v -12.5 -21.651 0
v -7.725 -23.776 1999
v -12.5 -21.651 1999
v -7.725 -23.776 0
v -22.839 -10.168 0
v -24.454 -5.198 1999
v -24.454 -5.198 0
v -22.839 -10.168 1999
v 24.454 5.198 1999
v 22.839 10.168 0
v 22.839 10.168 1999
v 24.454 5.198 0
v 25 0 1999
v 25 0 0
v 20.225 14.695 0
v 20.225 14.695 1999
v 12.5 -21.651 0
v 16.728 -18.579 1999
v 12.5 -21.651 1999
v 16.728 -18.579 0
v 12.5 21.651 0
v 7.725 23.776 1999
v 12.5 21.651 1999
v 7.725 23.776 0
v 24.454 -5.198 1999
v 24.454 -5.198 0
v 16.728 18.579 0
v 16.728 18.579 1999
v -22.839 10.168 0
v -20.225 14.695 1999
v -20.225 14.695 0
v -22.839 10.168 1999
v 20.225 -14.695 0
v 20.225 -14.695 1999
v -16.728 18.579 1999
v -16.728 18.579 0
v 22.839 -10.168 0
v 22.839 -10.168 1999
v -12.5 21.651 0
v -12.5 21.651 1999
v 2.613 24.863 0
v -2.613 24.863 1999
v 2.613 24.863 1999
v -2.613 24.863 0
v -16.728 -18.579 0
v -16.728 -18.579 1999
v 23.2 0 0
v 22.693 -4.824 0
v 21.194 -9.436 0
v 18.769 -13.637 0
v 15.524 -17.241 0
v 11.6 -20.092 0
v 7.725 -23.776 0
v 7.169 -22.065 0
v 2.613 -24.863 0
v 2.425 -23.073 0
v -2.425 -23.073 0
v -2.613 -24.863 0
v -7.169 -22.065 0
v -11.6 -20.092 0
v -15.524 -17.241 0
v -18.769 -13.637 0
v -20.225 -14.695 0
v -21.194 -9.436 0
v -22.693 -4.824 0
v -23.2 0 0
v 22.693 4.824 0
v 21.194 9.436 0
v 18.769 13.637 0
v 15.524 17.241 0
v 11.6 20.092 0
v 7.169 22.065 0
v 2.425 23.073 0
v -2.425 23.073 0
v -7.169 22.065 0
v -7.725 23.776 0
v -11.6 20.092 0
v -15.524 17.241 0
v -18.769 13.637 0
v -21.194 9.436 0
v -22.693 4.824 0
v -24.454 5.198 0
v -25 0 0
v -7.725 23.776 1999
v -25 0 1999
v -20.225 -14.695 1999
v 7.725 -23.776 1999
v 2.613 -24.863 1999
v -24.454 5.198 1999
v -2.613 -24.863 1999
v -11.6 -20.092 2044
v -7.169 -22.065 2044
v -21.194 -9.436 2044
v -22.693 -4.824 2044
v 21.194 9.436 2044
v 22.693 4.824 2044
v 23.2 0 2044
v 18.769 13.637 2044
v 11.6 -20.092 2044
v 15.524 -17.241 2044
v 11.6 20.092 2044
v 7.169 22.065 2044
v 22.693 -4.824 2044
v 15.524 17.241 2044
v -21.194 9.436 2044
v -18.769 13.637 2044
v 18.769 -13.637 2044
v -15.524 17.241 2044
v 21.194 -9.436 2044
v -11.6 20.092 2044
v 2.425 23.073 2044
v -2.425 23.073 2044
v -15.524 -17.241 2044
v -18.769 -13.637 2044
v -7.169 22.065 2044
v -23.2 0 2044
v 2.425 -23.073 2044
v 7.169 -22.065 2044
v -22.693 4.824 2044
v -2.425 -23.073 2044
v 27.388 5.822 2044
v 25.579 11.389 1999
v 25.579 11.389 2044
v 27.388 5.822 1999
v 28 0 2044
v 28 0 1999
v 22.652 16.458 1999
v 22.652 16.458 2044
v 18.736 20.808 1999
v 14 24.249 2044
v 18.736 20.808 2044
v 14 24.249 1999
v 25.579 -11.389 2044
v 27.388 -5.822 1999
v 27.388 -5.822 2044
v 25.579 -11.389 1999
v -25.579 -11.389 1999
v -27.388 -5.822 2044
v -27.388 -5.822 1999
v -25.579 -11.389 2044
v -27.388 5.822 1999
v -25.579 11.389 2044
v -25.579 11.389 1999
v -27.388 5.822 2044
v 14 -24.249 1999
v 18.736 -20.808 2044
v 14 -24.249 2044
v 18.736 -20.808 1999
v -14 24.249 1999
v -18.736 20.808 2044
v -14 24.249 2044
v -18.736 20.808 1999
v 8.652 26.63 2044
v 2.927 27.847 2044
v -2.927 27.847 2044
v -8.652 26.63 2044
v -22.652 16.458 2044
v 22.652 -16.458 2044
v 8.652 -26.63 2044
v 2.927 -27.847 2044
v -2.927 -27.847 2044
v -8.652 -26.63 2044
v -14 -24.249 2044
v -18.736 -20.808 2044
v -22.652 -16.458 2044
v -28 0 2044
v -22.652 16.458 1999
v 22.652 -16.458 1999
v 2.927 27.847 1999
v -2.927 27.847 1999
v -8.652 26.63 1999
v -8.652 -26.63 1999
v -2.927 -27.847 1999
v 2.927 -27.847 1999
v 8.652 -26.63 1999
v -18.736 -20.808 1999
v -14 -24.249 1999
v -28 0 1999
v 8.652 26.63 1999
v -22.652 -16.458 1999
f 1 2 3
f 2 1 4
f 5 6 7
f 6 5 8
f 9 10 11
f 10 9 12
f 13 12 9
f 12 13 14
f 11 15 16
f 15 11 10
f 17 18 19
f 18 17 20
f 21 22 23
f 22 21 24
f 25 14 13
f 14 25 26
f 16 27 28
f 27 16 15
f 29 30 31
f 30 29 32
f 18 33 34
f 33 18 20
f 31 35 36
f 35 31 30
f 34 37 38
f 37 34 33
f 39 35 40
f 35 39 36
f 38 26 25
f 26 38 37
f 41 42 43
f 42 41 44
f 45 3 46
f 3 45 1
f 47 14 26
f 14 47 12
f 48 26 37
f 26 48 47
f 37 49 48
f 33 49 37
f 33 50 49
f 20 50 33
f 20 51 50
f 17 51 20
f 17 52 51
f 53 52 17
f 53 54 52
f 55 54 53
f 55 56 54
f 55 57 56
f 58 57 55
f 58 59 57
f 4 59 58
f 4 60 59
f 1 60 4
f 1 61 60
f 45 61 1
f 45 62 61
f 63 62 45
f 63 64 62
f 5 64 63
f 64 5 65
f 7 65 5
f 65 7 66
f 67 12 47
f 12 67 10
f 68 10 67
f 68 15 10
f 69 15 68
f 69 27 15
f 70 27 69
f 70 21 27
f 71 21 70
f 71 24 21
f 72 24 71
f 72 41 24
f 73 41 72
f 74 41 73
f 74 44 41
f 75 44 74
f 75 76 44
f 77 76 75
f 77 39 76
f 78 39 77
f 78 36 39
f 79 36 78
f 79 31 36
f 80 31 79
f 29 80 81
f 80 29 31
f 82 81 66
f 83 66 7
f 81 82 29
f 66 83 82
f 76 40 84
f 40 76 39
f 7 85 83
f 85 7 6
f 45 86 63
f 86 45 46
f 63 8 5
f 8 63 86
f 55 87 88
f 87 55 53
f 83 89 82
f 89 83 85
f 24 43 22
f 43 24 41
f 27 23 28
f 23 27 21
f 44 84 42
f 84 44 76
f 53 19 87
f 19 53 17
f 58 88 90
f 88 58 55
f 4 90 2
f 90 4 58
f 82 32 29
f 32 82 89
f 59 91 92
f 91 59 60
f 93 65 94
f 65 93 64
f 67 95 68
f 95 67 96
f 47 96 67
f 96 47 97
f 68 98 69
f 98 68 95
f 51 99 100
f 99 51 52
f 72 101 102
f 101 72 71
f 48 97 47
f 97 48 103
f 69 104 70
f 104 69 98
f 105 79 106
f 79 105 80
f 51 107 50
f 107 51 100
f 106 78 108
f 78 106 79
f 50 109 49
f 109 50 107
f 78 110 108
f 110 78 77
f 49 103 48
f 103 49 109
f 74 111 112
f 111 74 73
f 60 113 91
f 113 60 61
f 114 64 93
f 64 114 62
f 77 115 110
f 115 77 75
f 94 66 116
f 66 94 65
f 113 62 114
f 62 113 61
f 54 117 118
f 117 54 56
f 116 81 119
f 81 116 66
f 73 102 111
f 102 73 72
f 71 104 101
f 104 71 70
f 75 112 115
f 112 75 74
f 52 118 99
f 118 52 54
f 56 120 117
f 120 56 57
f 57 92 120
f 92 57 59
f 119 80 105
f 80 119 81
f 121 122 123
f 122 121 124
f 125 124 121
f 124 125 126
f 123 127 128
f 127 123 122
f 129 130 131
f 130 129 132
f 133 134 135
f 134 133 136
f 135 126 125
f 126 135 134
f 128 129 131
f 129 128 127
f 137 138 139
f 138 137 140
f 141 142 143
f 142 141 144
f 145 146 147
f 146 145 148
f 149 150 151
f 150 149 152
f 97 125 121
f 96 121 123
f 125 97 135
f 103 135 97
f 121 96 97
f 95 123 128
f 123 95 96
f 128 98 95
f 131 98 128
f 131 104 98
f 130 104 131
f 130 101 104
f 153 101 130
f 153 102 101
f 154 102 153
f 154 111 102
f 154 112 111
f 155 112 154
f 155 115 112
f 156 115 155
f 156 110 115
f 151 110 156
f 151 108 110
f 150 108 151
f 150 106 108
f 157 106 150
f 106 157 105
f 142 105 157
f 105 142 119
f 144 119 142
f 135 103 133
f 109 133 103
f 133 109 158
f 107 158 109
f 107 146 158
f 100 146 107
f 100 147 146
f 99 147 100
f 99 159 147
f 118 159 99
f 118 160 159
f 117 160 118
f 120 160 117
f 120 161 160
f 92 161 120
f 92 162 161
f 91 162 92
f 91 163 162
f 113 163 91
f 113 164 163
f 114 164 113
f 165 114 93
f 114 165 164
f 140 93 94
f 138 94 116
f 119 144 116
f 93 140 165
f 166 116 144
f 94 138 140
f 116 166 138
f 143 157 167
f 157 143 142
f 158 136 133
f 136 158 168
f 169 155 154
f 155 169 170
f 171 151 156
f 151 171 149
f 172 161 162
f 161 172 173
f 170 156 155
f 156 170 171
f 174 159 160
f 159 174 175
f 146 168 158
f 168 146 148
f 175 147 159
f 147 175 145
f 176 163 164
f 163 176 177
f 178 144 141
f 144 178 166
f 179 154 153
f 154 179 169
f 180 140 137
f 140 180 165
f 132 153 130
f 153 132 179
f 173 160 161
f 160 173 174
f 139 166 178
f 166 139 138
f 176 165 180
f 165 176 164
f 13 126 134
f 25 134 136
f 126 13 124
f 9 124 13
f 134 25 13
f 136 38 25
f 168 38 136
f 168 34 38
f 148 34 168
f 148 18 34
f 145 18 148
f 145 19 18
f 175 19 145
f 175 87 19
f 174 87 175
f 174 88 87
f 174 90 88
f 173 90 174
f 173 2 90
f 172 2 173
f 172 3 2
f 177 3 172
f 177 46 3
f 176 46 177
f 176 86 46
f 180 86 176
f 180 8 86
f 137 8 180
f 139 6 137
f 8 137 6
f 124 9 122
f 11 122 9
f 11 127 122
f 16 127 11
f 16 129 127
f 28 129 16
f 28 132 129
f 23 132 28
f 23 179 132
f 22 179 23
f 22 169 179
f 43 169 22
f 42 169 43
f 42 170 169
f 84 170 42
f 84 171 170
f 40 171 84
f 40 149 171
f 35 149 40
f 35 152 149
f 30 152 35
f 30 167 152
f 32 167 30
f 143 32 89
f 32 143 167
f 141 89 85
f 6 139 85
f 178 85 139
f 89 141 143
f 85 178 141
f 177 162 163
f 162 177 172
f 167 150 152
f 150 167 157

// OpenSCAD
// Parameters
length_mm = 2000; //[1000:4000:10]
include_socket_end = 1; //[0:1:1]
center = 0; //[0:1:1]
pipe_od = 50; //[40:100:1]
pipe_wall = 1.8; //[1:4:0.1]
socket_length = 45; //[25:90:1]
socket_wall_extra = 1.2; //[0.5:3:0.1]
socket_od_extra = 6; //[2:15:0.5]
socket_overlap = 1; //[0.5:2:0.1]
epsilon = 0.5; //[0.2:2:0.1]

// Module for HT Pipe
module ht_pipe() {
  color([0.85, 0.85, 0.8]) {
    difference() {
      // Outer pipe
      cylinder(h=length_mm, r=pipe_od/2, center=false);
      // Inner void
      translate([0, 0, -epsilon])
        cylinder(h=length_mm + 2*epsilon, r=pipe_od/2 - pipe_wall, center=false);
    }
  }
}

// Module for Socket End Fitting
module socket_end_fitting() {
  if (include_socket_end) {
    color([0.85, 0.85, 0.8]) {
      difference() {
        // Outer socket
        translate([0, 0, length_mm - socket_overlap])
          cylinder(h=socket_length, r=pipe_od/2 + socket_od_extra/2, center=false);
        // Inner void
        translate([0, 0, length_mm - socket_overlap - epsilon])
          cylinder(h=socket_length + 2*epsilon, r=pipe_od/2 - pipe_wall, center=false);
      }
    }
  }
}

// Assembly of the HT Pipe Segment
module assembly() {
  union() {
    ht_pipe();
    socket_end_fitting();
  }
}

// Final assembly with centering option
translate([0, 0, -(length_mm/2)*center]) assembly();
